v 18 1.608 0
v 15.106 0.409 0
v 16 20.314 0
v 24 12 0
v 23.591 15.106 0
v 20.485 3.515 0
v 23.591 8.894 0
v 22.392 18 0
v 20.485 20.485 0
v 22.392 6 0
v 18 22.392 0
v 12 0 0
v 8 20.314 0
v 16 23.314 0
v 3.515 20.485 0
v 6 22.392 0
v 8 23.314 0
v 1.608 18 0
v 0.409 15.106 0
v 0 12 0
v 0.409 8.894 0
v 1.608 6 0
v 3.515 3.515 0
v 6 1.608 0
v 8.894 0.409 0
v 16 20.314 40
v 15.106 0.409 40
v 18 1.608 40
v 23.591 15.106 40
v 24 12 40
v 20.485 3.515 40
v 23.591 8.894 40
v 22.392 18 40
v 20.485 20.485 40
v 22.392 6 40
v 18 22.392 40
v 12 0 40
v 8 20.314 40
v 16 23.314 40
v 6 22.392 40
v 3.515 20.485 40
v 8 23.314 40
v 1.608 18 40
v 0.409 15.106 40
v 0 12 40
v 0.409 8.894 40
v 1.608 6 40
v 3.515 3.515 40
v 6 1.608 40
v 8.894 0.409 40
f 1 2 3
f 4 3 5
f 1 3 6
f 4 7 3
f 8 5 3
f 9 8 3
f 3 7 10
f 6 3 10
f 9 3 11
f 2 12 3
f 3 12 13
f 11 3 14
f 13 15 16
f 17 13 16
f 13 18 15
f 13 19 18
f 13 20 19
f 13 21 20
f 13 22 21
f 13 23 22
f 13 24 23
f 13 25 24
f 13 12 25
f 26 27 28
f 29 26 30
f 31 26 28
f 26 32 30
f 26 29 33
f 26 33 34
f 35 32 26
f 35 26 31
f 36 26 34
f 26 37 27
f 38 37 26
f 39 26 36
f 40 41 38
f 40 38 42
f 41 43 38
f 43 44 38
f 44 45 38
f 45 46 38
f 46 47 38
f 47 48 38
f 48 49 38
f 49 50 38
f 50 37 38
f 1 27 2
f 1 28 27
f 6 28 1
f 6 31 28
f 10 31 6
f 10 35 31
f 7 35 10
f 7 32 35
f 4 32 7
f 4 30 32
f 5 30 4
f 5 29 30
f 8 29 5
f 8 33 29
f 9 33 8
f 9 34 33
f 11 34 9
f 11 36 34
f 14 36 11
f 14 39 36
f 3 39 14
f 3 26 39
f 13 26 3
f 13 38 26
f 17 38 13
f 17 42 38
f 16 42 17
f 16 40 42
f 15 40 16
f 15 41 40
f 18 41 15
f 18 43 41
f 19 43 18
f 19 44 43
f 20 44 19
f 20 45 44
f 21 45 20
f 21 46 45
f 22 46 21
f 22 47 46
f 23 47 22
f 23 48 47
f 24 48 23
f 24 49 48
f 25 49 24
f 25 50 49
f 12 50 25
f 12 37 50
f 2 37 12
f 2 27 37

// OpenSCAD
$fn = 32;

// ----------------------------------------------------------------------
// Keyway shaft: d24 shaft, key 8 x 3 mm
// ----------------------------------------------------------------------

// --- parameters (mm) ---
shaft_r = 12;             // shaft radius
key_w = 8;                // keyway width
key_d = 3;                // keyway depth below the surface line
plate_t = 40;             // shaft length, Z (extrusion height)
fit_tol = 0.1;            // declared fit tolerance (prompt contract)
free_tol = 0.3;           // declared free tolerance (prompt contract)

shaft_d = 2 * shaft_r;  // shaft diameter
circle_step = 15;  // polygon sampling step, degrees

profile = [[6, 22.392], [3.515, 20.485], [1.608, 18], [0.409, 15.106], [0, 12], [0.409, 8.894], [1.608, 6], [3.515, 3.515], [6, 1.608], [8.894, 0.409], [12, 0], [15.106, 0.409], [18, 1.608], [20.485, 3.515], [22.392, 6], [23.591, 8.894], [24, 12], [23.591, 15.106], [22.392, 18], [20.485, 20.485], [18, 22.392], [16, 23.314], [16, 20.314], [8, 20.314], [8, 23.314]];  // primary outline, 25 points, counter clockwise

// --- the one profile operation ---
linear_extrude(height = plate_t) polygon(points = profile);
